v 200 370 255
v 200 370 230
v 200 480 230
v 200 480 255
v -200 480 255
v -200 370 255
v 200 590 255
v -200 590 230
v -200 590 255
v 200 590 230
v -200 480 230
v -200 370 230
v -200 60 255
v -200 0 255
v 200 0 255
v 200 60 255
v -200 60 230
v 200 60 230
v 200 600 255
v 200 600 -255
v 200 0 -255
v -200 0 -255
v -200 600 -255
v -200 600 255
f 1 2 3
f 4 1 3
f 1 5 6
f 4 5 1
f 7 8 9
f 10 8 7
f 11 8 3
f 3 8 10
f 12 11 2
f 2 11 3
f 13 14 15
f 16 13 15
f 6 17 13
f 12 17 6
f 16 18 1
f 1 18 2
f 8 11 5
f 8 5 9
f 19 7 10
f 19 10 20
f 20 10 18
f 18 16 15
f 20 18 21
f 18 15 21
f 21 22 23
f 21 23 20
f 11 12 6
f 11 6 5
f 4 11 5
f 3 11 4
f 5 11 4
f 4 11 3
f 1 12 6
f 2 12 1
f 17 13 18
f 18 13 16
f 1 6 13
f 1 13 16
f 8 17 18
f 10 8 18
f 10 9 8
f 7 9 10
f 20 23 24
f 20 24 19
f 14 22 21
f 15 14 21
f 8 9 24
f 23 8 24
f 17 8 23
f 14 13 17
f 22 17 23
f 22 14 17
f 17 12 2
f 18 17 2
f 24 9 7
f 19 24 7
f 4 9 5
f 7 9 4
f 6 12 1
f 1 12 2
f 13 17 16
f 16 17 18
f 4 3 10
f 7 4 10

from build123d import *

# Parameters (mm, degrees)
SKETCH1_W           = 400
SKETCH1_H           = 510
BOSS_EXTRUDE1_DEPTH = 600
SKETCH2_W           = 400
SKETCH2_H           = 110
SKETCH2_H_2         = 310
CUT_EXTRUDE1_DEPTH  = 25
BOSS_EXTRUDE3_START = -25
SKETCH2_4_W         = 400
SKETCH2_4_H         = 110
BOSS_EXTRUDE3_DEPTH = 25
BOSS_EXTRUDE4_START = -25
SKETCH2_5_W         = 400
SKETCH2_5_H         = 110
BOSS_EXTRUDE4_DEPTH = 25
BOSS_EXTRUDE5_START = -25
SKETCH2_6_W         = 400
SKETCH2_6_H         = 310
BOSS_EXTRUDE5_DEPTH = 25


with BuildPart() as part:
    # Sketch1 → Boss-Extrude1 (new body)
    with BuildSketch(Plane(origin=(0, 0, 0), x_dir=(1, 0, 0), z_dir=(0, 1, 0))):
        Rectangle(SKETCH1_W, SKETCH1_H)
    extrude(amount=BOSS_EXTRUDE1_DEPTH)

    # Sketch2 → Cut-Extrude1 (cut)
    with BuildSketch(Plane.XY.offset(255)):
        with Locations((0, 425)):
            Rectangle(SKETCH2_W, SKETCH2_H)
        with Locations((0, 535)):
            Rectangle(SKETCH2_W, SKETCH2_H)
        with Locations((0, 215)):
            Rectangle(SKETCH2_W, SKETCH2_H_2)
    extrude(amount=-CUT_EXTRUDE1_DEPTH, mode=Mode.SUBTRACT)


with BuildPart() as body_2:
    # Sketch2<4> → Boss-Extrude3 (new body)
    with BuildSketch(Plane.XY.offset(255).offset(BOSS_EXTRUDE3_START)):
        with Locations((0, 535)):
            Rectangle(SKETCH2_4_W, SKETCH2_4_H)
    extrude(amount=BOSS_EXTRUDE3_DEPTH)


with BuildPart() as body_3:
    # Sketch2<5> → Boss-Extrude4 (new body)
    with BuildSketch(Plane.XY.offset(255).offset(BOSS_EXTRUDE4_START)):
        with Locations((0, 425)):
            Rectangle(SKETCH2_5_W, SKETCH2_5_H)
    extrude(amount=BOSS_EXTRUDE4_DEPTH)


with BuildPart() as body_4:
    # Sketch2<6> → Boss-Extrude5 (new body)
    with BuildSketch(Plane.XY.offset(255).offset(BOSS_EXTRUDE5_START)):
        with Locations((0, 215)):
            Rectangle(SKETCH2_6_W, SKETCH2_6_H)
    extrude(amount=BOSS_EXTRUDE5_DEPTH)


solid = Compound([part.part, body_2.part, body_3.part, body_4.part])
